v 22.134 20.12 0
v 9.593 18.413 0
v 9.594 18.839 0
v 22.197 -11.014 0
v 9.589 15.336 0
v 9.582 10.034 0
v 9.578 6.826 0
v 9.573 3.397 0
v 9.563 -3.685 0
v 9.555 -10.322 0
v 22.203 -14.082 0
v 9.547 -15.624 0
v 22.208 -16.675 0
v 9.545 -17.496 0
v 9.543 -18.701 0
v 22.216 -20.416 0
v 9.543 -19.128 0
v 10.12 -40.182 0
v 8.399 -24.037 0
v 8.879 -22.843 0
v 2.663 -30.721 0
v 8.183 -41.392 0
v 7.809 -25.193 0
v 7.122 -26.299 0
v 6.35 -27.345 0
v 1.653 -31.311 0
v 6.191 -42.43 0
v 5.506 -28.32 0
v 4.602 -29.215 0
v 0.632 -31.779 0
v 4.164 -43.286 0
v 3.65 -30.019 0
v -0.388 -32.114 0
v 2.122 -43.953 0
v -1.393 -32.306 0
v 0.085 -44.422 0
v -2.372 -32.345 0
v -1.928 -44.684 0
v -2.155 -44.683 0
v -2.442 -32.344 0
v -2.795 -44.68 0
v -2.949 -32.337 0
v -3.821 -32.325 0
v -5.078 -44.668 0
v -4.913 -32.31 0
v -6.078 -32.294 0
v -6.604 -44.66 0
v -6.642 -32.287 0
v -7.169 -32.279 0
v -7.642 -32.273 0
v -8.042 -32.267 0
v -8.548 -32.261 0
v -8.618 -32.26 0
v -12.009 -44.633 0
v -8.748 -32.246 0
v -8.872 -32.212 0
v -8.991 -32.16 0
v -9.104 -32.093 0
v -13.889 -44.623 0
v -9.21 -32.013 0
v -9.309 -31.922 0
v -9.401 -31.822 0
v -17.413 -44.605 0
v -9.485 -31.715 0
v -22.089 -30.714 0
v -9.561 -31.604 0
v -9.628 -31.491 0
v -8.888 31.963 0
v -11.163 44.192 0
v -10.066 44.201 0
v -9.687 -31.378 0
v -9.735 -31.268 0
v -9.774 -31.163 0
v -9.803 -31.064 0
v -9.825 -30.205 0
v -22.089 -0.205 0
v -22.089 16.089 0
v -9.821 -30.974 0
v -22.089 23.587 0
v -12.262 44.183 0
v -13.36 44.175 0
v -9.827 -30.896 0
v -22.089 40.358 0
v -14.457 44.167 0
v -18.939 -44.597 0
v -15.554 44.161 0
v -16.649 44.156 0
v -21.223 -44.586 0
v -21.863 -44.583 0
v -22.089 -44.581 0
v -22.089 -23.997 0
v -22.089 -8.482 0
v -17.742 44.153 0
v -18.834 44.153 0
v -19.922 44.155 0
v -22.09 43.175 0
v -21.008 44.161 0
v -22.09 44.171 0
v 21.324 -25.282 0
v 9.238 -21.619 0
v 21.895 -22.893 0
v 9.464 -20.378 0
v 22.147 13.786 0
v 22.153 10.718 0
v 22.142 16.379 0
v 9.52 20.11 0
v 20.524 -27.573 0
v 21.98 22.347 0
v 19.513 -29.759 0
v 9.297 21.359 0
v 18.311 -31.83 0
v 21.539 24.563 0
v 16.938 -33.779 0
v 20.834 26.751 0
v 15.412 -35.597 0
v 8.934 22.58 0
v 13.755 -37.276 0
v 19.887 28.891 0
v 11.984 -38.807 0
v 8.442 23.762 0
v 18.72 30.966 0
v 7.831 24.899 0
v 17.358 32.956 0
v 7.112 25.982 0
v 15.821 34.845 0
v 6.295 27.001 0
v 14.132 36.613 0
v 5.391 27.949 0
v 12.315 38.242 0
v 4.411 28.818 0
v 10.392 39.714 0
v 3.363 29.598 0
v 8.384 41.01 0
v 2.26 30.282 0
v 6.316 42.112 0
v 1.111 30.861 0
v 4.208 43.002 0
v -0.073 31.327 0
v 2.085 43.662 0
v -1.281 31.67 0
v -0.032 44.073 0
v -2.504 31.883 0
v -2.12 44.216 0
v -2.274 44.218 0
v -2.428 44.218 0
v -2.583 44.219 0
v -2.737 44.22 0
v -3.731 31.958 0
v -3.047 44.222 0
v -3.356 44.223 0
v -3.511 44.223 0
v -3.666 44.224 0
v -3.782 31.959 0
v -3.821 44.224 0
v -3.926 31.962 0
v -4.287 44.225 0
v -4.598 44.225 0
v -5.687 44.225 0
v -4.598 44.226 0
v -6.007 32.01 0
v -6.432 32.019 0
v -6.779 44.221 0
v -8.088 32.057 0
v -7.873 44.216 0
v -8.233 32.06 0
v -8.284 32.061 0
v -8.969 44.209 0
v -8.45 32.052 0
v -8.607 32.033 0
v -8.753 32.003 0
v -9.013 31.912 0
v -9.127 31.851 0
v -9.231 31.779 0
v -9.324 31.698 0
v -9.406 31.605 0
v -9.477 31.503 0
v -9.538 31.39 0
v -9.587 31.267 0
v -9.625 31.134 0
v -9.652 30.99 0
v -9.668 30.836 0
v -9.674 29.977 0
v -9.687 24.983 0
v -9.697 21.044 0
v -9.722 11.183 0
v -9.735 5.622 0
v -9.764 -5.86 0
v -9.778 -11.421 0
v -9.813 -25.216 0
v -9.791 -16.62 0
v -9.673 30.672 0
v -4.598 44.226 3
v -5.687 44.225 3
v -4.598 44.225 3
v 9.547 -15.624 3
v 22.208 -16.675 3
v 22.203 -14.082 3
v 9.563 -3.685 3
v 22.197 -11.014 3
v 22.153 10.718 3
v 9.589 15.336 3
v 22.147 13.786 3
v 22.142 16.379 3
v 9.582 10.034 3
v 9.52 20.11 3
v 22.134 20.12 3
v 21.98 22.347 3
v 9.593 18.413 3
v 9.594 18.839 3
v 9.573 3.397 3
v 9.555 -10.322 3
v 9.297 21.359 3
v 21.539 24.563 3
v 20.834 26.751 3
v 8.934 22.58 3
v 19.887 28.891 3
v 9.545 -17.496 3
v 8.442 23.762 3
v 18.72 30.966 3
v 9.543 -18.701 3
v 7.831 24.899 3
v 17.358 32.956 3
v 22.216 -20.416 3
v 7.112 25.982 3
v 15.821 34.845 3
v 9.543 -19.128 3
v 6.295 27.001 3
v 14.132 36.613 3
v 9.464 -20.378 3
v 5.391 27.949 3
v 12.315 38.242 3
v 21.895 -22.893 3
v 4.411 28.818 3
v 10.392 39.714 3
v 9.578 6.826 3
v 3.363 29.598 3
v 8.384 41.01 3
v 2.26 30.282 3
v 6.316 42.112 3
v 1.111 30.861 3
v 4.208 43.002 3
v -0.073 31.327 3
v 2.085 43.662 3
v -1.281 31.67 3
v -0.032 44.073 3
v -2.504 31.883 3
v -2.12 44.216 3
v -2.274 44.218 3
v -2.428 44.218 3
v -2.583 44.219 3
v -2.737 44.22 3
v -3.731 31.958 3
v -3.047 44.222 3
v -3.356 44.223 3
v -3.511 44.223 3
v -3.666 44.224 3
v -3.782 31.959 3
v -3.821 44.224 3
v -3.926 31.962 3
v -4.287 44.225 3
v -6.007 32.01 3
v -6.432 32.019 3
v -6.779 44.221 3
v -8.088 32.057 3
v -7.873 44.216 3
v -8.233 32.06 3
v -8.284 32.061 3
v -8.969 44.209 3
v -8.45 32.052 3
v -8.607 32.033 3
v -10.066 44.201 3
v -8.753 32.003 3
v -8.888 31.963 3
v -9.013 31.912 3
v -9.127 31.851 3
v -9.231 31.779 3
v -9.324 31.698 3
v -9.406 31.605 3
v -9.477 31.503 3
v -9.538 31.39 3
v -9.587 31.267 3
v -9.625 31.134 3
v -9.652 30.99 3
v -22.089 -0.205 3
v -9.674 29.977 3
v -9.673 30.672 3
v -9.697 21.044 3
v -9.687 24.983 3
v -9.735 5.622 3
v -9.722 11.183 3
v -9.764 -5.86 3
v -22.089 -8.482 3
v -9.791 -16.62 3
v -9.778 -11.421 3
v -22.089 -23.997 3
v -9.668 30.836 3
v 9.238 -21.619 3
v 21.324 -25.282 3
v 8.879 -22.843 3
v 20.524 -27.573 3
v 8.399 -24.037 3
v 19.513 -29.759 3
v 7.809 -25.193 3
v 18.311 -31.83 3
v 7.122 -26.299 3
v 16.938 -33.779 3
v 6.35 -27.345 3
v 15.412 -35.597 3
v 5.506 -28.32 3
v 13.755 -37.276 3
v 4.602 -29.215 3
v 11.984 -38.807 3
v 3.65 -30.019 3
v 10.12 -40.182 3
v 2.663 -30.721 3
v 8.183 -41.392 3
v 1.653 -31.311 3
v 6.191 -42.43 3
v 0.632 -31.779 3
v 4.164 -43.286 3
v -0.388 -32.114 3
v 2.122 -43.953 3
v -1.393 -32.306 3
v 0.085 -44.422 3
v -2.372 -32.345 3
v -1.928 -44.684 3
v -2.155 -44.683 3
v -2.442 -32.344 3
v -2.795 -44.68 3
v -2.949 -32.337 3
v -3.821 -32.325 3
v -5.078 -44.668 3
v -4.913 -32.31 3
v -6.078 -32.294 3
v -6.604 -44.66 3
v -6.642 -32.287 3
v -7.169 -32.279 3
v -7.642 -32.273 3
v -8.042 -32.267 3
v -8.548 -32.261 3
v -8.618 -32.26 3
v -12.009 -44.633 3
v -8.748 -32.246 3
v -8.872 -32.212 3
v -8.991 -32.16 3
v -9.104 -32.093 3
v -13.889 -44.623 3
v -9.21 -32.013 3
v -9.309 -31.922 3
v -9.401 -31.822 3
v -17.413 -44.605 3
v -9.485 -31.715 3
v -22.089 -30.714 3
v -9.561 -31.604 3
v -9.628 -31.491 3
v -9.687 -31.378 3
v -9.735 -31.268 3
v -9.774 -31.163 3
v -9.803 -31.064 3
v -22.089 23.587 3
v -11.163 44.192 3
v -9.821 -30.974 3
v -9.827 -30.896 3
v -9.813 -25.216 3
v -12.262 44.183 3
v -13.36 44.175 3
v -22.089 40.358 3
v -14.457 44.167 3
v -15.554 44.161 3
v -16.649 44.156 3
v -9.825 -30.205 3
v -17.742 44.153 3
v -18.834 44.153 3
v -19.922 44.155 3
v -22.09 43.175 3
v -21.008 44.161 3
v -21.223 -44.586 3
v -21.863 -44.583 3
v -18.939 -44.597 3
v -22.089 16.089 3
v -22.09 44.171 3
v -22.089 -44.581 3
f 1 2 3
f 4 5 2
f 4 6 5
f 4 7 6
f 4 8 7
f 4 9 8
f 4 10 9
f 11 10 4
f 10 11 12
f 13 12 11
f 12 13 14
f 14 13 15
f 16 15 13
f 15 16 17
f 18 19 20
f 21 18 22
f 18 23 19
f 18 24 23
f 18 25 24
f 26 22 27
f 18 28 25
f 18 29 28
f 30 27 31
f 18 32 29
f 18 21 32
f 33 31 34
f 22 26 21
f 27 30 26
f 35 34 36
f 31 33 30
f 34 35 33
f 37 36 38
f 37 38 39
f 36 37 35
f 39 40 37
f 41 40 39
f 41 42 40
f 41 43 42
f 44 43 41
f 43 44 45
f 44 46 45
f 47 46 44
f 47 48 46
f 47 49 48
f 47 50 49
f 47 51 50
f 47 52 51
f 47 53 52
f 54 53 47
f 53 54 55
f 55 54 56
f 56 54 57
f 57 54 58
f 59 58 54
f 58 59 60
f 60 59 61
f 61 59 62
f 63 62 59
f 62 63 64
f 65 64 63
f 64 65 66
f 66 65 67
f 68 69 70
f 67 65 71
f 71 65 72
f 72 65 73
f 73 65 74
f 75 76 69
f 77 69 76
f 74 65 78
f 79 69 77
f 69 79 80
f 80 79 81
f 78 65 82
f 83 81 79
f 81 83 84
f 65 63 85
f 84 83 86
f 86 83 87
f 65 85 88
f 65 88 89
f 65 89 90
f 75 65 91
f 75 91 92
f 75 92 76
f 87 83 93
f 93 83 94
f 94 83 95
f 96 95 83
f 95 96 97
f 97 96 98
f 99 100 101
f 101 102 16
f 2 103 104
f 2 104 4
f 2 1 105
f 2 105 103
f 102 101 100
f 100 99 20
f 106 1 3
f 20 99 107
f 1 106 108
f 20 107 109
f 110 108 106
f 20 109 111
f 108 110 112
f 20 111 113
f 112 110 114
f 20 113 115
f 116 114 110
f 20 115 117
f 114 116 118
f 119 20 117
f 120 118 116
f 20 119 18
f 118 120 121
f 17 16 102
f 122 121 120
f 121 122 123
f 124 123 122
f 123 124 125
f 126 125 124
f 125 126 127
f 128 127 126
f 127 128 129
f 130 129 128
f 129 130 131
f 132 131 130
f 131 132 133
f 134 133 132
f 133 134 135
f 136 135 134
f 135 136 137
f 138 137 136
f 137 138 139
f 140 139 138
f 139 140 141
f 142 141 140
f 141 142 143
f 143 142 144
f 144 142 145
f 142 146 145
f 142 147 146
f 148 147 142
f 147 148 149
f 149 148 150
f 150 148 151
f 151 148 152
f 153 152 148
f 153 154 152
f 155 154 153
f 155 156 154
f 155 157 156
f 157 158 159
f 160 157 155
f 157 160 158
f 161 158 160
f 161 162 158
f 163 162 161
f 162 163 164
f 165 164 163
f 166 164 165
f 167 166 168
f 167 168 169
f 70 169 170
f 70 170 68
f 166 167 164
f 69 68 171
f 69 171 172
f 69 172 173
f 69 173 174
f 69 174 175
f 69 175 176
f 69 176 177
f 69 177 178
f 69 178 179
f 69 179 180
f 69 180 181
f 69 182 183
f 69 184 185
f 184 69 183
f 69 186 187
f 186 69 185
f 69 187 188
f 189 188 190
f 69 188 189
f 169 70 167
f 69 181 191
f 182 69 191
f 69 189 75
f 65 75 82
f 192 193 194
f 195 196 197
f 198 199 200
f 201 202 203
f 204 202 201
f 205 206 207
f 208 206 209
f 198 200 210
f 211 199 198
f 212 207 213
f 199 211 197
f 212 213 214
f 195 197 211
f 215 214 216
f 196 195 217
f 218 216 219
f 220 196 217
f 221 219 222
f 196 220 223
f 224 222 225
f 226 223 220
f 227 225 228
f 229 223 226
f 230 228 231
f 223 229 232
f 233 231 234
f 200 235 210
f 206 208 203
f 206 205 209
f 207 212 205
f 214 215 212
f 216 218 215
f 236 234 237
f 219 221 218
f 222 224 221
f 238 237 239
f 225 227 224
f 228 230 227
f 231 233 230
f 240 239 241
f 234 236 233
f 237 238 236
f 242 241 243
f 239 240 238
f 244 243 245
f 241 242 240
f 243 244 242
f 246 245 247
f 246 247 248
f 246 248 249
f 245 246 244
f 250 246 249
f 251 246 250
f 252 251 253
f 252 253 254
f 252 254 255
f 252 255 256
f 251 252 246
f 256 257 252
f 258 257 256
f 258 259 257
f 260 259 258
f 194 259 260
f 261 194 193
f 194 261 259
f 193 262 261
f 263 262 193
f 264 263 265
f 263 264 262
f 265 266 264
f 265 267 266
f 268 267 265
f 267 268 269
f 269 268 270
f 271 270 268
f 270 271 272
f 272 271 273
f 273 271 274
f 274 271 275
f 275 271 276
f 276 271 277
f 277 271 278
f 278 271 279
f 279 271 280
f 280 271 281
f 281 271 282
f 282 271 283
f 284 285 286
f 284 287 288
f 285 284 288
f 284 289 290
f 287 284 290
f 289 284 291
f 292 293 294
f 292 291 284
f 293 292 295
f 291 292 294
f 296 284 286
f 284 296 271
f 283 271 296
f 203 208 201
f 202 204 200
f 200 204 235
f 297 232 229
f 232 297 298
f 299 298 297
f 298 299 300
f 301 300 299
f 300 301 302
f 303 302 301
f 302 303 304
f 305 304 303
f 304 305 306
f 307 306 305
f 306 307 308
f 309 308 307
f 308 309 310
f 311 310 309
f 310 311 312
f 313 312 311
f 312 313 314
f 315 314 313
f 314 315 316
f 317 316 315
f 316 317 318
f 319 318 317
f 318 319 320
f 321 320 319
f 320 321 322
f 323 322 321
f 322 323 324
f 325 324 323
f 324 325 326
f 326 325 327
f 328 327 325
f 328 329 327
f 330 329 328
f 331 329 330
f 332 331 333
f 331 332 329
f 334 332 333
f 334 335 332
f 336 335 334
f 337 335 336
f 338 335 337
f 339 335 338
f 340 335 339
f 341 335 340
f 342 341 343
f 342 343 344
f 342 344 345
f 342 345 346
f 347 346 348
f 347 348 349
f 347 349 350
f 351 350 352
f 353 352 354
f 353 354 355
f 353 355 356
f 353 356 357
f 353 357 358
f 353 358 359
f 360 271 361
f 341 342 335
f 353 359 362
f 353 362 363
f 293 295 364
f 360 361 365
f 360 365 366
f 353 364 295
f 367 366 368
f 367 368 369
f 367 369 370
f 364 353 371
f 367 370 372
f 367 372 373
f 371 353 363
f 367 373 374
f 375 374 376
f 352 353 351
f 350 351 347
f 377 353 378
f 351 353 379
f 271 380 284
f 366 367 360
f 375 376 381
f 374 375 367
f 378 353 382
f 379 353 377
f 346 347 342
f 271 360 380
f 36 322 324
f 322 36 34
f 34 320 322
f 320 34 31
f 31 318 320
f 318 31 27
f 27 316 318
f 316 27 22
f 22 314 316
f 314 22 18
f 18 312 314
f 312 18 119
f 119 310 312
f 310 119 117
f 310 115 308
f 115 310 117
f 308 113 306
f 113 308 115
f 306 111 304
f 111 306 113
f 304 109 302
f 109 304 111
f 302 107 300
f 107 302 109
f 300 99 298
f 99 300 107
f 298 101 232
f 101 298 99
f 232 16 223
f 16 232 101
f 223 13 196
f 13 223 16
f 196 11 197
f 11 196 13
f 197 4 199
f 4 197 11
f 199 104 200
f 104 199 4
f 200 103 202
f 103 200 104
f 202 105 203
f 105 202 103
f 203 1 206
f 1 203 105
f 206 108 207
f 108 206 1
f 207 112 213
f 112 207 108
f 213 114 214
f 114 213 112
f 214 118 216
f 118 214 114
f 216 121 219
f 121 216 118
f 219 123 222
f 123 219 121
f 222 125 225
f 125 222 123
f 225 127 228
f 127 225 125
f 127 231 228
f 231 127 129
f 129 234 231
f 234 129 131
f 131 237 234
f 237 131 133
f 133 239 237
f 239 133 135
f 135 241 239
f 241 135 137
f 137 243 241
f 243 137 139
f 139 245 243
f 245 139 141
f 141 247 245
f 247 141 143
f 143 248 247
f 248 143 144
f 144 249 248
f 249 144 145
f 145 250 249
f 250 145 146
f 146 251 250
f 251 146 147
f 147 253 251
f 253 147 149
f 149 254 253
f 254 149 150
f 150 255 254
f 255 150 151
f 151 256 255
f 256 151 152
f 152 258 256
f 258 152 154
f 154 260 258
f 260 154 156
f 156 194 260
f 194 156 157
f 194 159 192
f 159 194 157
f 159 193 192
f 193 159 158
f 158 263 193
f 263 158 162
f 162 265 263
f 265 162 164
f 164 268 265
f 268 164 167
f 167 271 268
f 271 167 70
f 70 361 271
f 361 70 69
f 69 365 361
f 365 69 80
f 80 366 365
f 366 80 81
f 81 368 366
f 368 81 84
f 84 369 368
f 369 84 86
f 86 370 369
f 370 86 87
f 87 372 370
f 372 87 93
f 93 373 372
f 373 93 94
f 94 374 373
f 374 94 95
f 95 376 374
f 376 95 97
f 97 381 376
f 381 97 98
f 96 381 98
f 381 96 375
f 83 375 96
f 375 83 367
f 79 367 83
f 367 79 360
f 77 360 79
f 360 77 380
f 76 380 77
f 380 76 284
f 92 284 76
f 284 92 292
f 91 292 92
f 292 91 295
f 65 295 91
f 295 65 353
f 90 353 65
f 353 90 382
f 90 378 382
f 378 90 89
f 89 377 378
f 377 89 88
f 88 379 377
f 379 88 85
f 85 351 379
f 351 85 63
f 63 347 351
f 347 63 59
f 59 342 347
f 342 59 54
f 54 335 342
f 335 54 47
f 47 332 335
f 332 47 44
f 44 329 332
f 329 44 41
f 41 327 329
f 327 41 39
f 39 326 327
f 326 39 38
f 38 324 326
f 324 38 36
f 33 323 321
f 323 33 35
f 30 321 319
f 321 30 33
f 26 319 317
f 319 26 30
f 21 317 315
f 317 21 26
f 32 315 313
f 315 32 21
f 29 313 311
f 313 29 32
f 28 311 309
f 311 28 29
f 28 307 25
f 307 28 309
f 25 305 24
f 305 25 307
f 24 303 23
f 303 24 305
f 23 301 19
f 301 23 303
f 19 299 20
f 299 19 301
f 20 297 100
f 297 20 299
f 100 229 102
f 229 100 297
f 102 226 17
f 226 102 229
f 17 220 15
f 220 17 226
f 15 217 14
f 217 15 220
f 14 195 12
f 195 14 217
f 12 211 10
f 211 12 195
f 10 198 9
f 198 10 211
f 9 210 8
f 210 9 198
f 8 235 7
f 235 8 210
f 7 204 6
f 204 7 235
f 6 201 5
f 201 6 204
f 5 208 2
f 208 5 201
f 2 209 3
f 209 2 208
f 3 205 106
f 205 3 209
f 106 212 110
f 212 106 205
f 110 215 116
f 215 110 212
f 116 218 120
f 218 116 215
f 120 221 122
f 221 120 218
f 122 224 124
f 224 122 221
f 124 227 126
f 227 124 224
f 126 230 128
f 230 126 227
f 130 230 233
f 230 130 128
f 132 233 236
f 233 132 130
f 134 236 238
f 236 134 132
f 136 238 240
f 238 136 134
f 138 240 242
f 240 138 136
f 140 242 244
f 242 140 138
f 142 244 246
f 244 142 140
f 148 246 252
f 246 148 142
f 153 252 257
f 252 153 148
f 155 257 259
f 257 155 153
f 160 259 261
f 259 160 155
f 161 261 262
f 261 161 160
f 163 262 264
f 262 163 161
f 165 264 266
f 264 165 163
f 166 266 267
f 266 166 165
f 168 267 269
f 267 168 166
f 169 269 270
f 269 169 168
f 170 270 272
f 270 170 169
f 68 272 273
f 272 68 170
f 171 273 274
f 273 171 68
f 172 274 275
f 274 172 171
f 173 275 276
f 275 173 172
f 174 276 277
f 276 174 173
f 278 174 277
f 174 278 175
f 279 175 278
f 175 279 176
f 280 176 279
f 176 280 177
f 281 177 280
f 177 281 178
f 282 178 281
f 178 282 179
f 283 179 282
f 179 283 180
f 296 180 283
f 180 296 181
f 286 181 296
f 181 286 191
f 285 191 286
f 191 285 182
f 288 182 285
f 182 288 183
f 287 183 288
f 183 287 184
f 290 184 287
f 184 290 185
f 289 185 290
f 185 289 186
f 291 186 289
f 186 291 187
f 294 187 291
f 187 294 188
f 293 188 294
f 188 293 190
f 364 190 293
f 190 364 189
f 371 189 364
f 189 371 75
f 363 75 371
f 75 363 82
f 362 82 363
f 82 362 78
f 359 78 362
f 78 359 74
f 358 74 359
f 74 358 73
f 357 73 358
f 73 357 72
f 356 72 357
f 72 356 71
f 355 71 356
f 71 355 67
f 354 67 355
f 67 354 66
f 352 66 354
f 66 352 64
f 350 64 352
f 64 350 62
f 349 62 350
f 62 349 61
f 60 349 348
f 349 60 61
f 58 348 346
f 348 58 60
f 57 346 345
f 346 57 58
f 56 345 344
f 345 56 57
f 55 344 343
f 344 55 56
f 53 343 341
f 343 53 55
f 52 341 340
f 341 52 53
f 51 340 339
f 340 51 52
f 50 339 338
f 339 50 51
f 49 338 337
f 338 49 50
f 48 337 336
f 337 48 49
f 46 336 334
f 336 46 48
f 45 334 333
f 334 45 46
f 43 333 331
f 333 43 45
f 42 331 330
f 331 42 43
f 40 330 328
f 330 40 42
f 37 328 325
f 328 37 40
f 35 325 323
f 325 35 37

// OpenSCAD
// Generated from 交通部公路局（原交通部公路總局）「新式號牌使用之英文字、數字字體」author trace
fudge = 0.1;

module glyph_2012_D(h = 3) {
  difference() {
    linear_extrude(height = h)
      polygon(points = [[-4.5978, 44.2257], [-5.6872, 44.2246], [-6.7791, 44.221], [-7.8731, 44.2156], [-8.9688, 44.2086], [-10.0658, 44.2006], [-11.1635, 44.192], [-12.2616, 44.1833], [-13.3597, 44.1749], [-14.4572, 44.1672], [-15.5538, 44.1607], [-16.649, 44.1558], [-17.7425, 44.153], [-18.8337, 44.1527], [-19.9222, 44.1554], [-21.0077, 44.1615], [-22.0896, 44.1715], [-22.0896, 43.1748], [-22.0895, 40.3579], [-22.0895, 35.9809], [-22.0895, 30.3039], [-22.0895, 23.5867], [-22.0894, 16.0895], [-22.0894, 8.0723], [-22.0894, -0.205], [-22.0893, -8.4822], [-22.0893, -16.4994], [-22.0893, -23.9966], [-22.0892, -30.7138], [-22.0892, -36.3908], [-22.0892, -40.7678], [-22.0892, -43.5847], [-22.0892, -44.5814], [-21.8627, -44.5826], [-21.2229, -44.5858], [-20.2286, -44.5909], [-18.939, -44.5975], [-17.4132, -44.6052], [-15.7102, -44.6139], [-13.889, -44.6232], [-12.0088, -44.6327], [-10.1285, -44.6423], [-8.3074, -44.6516], [-6.6043, -44.6603], [-5.0785, -44.668], [-3.7889, -44.6746], [-2.7946, -44.6797], [-2.1548, -44.6829], [-1.9283, -44.6841], [0.0851, -44.4218], [2.1225, -43.953], [4.1643, -43.2862], [6.1908, -42.4298], [8.1827, -41.3922], [10.1203, -40.1817], [11.9841, -38.8067], [13.7547, -37.2756], [15.4123, -35.5969], [16.9376, -33.7789], [18.311, -31.83], [19.513, -29.7586], [20.524, -27.5731], [21.3244, -25.2819], [21.8948, -22.8934], [22.2157, -20.4159], [22.2148, -19.9607], [22.2122, -18.6741], [22.2082, -16.675], [22.2029, -14.0821], [22.1968, -11.0142], [22.1899, -7.59], [22.1825, -3.9283], [22.1749, -0.1479], [22.1673, 3.6326], [22.1599, 7.2943], [22.153, 10.7185], [22.1469, 13.7864], [22.1416, 16.3793], [22.1376, 18.3784], [22.135, 19.665], [22.1341, 20.1202], [21.98, 22.3471], [21.539, 24.5635], [20.8338, 26.7509], [19.8867, 28.8911], [18.7205, 30.9657], [17.3577, 32.9564], [15.8209, 34.8449], [14.1325, 36.6128], [12.3153, 38.2418], [10.3917, 39.7136], [8.3843, 41.0098], [6.3156, 42.1122], [4.2084, 43.0024], [2.085, 43.6621], [-0.0319, 44.0729], [-2.1197, 44.2165], [-2.2741, 44.2176], [-2.4285, 44.2185], [-2.583, 44.2195], [-2.7375, 44.2203], [-2.8922, 44.221], [-3.0469, 44.2217], [-3.2016, 44.2223], [-3.3565, 44.2229], [-3.5114, 44.2233], [-3.6664, 44.2238], [-3.8215, 44.2242], [-3.9766, 44.2245], [-4.1318, 44.2248], [-4.287, 44.2251], [-4.4424, 44.2253], [-4.5978, 44.2255], [-4.5978, 44.2255], [-4.5978, 44.2255], [-4.5978, 44.2255], [-4.5978, 44.2255], [-4.5978, 44.2255], [-4.5978, 44.2256], [-4.5978, 44.2256], [-4.5978, 44.2256], [-4.5978, 44.2256], [-4.5978, 44.2256], [-4.5978, 44.2257], [-4.5978, 44.2257], [-4.5978, 44.2257], [-4.5978, 44.2257], [-4.5978, 44.2257]]);
    translate([0, 0, -fudge])
      linear_extrude(height = h + 2 * fudge)
        polygon(points = [[-8.2838, 32.0612], [-8.2326, 32.06], [-8.0881, 32.0568], [-7.8636, 32.0517], [-7.5724, 32.0451], [-7.2278, 32.0373], [-6.8432, 32.0286], [-6.4319, 32.0193], [-6.0073, 32.0096], [-5.5826, 32], [-5.1714, 31.9907], [-4.7868, 31.982], [-4.4422, 31.9742], [-4.1509, 31.9676], [-3.9264, 31.9625], [-3.7819, 31.9593], [-3.7308, 31.9581], [-2.5041, 31.8835], [-1.2813, 31.6702], [-0.0727, 31.3266], [1.1112, 30.8612], [2.26, 30.2823], [3.3633, 29.5985], [4.4106, 28.818], [5.3914, 27.9495], [6.2953, 27.0012], [7.112, 25.9816], [7.8309, 24.8992], [8.4416, 23.7624], [8.9338, 22.5796], [9.2968, 21.3592], [9.5204, 20.1097], [9.594, 18.8395], [9.5934, 18.4131], [9.5918, 17.2081], [9.5893, 15.3356], [9.586, 12.9071], [9.5821, 10.0336], [9.5778, 6.8264], [9.5731, 3.3967], [9.5683, -0.1442], [9.5635, -3.6851], [9.5589, -7.1148], [9.5546, -10.322], [9.5507, -13.1955], [9.5474, -15.6241], [9.5449, -17.4965], [9.5432, -18.7015], [9.5427, -19.1279], [9.4637, -20.3777], [9.2385, -21.6195], [8.8794, -22.8429], [8.3986, -24.0375], [7.8086, -25.1929], [7.1216, -26.2988], [6.3499, -27.3447], [5.5058, -28.3202], [4.6018, -29.215], [3.65, -30.0187], [2.6629, -30.7209], [1.6527, -31.3111], [0.6317, -31.7791], [-0.3876, -32.1143], [-1.3931, -32.3065], [-2.3724, -32.3452], [-2.4425, -32.3442], [-2.6407, -32.3415], [-2.9488, -32.3373], [-3.3483, -32.3318], [-3.8209, -32.3253], [-4.3485, -32.3181], [-4.9127, -32.3104], [-5.4952, -32.3024], [-6.0777, -32.2944], [-6.6418, -32.2867], [-7.1694, -32.2794], [-7.6421, -32.273], [-8.0416, -32.2675], [-8.3496, -32.2633], [-8.5478, -32.2606], [-8.618, -32.2596], [-8.7477, -32.2458], [-8.8721, -32.212], [-8.9909, -32.1605], [-9.1036, -32.0934], [-9.2098, -32.0131], [-9.3091, -31.9218], [-9.401, -31.8218], [-9.4852, -31.7151], [-9.5611, -31.6042], [-9.6284, -31.4913], [-9.6867, -31.3785], [-9.7354, -31.2682], [-9.7743, -31.1626], [-9.8028, -31.0638], [-9.8206, -30.9742], [-9.8271, -30.896], [-9.8254, -30.2048], [-9.8205, -28.2514], [-9.8129, -25.2159], [-9.803, -21.2788], [-9.7913, -16.6203], [-9.7783, -11.4208], [-9.7643, -5.8604], [-9.7499, -0.1194], [-9.7355, 5.6217], [-9.7216, 11.1828], [-9.7085, 16.3836], [-9.6968, 21.0437], [-9.687, 24.9829], [-9.6794, 28.0209], [-9.6745, 29.9775], [-9.6728, 30.6722], [-9.6682, 30.8362], [-9.6523, 30.99], [-9.6253, 31.1336], [-9.587, 31.267], [-9.5377, 31.3901], [-9.4774, 31.5029], [-9.4061, 31.6054], [-9.324, 31.6976], [-9.231, 31.7795], [-9.1273, 31.851], [-9.013, 31.9121], [-8.888, 31.9628], [-8.7526, 32.0031], [-8.6067, 32.033], [-8.4504, 32.0523], [-8.2838, 32.0612], [-8.2838, 32.0612], [-8.2838, 32.0612], [-8.2838, 32.0612], [-8.2838, 32.0612], [-8.2838, 32.0612], [-8.2838, 32.0612], [-8.2838, 32.0612], [-8.2838, 32.0612], [-8.2838, 32.0612], [-8.2838, 32.0612], [-8.2838, 32.0612], [-8.2838, 32.0612], [-8.2838, 32.0612], [-8.2838, 32.0612], [-8.2838, 32.0612]]);
  }
}

glyph_2012_D();
